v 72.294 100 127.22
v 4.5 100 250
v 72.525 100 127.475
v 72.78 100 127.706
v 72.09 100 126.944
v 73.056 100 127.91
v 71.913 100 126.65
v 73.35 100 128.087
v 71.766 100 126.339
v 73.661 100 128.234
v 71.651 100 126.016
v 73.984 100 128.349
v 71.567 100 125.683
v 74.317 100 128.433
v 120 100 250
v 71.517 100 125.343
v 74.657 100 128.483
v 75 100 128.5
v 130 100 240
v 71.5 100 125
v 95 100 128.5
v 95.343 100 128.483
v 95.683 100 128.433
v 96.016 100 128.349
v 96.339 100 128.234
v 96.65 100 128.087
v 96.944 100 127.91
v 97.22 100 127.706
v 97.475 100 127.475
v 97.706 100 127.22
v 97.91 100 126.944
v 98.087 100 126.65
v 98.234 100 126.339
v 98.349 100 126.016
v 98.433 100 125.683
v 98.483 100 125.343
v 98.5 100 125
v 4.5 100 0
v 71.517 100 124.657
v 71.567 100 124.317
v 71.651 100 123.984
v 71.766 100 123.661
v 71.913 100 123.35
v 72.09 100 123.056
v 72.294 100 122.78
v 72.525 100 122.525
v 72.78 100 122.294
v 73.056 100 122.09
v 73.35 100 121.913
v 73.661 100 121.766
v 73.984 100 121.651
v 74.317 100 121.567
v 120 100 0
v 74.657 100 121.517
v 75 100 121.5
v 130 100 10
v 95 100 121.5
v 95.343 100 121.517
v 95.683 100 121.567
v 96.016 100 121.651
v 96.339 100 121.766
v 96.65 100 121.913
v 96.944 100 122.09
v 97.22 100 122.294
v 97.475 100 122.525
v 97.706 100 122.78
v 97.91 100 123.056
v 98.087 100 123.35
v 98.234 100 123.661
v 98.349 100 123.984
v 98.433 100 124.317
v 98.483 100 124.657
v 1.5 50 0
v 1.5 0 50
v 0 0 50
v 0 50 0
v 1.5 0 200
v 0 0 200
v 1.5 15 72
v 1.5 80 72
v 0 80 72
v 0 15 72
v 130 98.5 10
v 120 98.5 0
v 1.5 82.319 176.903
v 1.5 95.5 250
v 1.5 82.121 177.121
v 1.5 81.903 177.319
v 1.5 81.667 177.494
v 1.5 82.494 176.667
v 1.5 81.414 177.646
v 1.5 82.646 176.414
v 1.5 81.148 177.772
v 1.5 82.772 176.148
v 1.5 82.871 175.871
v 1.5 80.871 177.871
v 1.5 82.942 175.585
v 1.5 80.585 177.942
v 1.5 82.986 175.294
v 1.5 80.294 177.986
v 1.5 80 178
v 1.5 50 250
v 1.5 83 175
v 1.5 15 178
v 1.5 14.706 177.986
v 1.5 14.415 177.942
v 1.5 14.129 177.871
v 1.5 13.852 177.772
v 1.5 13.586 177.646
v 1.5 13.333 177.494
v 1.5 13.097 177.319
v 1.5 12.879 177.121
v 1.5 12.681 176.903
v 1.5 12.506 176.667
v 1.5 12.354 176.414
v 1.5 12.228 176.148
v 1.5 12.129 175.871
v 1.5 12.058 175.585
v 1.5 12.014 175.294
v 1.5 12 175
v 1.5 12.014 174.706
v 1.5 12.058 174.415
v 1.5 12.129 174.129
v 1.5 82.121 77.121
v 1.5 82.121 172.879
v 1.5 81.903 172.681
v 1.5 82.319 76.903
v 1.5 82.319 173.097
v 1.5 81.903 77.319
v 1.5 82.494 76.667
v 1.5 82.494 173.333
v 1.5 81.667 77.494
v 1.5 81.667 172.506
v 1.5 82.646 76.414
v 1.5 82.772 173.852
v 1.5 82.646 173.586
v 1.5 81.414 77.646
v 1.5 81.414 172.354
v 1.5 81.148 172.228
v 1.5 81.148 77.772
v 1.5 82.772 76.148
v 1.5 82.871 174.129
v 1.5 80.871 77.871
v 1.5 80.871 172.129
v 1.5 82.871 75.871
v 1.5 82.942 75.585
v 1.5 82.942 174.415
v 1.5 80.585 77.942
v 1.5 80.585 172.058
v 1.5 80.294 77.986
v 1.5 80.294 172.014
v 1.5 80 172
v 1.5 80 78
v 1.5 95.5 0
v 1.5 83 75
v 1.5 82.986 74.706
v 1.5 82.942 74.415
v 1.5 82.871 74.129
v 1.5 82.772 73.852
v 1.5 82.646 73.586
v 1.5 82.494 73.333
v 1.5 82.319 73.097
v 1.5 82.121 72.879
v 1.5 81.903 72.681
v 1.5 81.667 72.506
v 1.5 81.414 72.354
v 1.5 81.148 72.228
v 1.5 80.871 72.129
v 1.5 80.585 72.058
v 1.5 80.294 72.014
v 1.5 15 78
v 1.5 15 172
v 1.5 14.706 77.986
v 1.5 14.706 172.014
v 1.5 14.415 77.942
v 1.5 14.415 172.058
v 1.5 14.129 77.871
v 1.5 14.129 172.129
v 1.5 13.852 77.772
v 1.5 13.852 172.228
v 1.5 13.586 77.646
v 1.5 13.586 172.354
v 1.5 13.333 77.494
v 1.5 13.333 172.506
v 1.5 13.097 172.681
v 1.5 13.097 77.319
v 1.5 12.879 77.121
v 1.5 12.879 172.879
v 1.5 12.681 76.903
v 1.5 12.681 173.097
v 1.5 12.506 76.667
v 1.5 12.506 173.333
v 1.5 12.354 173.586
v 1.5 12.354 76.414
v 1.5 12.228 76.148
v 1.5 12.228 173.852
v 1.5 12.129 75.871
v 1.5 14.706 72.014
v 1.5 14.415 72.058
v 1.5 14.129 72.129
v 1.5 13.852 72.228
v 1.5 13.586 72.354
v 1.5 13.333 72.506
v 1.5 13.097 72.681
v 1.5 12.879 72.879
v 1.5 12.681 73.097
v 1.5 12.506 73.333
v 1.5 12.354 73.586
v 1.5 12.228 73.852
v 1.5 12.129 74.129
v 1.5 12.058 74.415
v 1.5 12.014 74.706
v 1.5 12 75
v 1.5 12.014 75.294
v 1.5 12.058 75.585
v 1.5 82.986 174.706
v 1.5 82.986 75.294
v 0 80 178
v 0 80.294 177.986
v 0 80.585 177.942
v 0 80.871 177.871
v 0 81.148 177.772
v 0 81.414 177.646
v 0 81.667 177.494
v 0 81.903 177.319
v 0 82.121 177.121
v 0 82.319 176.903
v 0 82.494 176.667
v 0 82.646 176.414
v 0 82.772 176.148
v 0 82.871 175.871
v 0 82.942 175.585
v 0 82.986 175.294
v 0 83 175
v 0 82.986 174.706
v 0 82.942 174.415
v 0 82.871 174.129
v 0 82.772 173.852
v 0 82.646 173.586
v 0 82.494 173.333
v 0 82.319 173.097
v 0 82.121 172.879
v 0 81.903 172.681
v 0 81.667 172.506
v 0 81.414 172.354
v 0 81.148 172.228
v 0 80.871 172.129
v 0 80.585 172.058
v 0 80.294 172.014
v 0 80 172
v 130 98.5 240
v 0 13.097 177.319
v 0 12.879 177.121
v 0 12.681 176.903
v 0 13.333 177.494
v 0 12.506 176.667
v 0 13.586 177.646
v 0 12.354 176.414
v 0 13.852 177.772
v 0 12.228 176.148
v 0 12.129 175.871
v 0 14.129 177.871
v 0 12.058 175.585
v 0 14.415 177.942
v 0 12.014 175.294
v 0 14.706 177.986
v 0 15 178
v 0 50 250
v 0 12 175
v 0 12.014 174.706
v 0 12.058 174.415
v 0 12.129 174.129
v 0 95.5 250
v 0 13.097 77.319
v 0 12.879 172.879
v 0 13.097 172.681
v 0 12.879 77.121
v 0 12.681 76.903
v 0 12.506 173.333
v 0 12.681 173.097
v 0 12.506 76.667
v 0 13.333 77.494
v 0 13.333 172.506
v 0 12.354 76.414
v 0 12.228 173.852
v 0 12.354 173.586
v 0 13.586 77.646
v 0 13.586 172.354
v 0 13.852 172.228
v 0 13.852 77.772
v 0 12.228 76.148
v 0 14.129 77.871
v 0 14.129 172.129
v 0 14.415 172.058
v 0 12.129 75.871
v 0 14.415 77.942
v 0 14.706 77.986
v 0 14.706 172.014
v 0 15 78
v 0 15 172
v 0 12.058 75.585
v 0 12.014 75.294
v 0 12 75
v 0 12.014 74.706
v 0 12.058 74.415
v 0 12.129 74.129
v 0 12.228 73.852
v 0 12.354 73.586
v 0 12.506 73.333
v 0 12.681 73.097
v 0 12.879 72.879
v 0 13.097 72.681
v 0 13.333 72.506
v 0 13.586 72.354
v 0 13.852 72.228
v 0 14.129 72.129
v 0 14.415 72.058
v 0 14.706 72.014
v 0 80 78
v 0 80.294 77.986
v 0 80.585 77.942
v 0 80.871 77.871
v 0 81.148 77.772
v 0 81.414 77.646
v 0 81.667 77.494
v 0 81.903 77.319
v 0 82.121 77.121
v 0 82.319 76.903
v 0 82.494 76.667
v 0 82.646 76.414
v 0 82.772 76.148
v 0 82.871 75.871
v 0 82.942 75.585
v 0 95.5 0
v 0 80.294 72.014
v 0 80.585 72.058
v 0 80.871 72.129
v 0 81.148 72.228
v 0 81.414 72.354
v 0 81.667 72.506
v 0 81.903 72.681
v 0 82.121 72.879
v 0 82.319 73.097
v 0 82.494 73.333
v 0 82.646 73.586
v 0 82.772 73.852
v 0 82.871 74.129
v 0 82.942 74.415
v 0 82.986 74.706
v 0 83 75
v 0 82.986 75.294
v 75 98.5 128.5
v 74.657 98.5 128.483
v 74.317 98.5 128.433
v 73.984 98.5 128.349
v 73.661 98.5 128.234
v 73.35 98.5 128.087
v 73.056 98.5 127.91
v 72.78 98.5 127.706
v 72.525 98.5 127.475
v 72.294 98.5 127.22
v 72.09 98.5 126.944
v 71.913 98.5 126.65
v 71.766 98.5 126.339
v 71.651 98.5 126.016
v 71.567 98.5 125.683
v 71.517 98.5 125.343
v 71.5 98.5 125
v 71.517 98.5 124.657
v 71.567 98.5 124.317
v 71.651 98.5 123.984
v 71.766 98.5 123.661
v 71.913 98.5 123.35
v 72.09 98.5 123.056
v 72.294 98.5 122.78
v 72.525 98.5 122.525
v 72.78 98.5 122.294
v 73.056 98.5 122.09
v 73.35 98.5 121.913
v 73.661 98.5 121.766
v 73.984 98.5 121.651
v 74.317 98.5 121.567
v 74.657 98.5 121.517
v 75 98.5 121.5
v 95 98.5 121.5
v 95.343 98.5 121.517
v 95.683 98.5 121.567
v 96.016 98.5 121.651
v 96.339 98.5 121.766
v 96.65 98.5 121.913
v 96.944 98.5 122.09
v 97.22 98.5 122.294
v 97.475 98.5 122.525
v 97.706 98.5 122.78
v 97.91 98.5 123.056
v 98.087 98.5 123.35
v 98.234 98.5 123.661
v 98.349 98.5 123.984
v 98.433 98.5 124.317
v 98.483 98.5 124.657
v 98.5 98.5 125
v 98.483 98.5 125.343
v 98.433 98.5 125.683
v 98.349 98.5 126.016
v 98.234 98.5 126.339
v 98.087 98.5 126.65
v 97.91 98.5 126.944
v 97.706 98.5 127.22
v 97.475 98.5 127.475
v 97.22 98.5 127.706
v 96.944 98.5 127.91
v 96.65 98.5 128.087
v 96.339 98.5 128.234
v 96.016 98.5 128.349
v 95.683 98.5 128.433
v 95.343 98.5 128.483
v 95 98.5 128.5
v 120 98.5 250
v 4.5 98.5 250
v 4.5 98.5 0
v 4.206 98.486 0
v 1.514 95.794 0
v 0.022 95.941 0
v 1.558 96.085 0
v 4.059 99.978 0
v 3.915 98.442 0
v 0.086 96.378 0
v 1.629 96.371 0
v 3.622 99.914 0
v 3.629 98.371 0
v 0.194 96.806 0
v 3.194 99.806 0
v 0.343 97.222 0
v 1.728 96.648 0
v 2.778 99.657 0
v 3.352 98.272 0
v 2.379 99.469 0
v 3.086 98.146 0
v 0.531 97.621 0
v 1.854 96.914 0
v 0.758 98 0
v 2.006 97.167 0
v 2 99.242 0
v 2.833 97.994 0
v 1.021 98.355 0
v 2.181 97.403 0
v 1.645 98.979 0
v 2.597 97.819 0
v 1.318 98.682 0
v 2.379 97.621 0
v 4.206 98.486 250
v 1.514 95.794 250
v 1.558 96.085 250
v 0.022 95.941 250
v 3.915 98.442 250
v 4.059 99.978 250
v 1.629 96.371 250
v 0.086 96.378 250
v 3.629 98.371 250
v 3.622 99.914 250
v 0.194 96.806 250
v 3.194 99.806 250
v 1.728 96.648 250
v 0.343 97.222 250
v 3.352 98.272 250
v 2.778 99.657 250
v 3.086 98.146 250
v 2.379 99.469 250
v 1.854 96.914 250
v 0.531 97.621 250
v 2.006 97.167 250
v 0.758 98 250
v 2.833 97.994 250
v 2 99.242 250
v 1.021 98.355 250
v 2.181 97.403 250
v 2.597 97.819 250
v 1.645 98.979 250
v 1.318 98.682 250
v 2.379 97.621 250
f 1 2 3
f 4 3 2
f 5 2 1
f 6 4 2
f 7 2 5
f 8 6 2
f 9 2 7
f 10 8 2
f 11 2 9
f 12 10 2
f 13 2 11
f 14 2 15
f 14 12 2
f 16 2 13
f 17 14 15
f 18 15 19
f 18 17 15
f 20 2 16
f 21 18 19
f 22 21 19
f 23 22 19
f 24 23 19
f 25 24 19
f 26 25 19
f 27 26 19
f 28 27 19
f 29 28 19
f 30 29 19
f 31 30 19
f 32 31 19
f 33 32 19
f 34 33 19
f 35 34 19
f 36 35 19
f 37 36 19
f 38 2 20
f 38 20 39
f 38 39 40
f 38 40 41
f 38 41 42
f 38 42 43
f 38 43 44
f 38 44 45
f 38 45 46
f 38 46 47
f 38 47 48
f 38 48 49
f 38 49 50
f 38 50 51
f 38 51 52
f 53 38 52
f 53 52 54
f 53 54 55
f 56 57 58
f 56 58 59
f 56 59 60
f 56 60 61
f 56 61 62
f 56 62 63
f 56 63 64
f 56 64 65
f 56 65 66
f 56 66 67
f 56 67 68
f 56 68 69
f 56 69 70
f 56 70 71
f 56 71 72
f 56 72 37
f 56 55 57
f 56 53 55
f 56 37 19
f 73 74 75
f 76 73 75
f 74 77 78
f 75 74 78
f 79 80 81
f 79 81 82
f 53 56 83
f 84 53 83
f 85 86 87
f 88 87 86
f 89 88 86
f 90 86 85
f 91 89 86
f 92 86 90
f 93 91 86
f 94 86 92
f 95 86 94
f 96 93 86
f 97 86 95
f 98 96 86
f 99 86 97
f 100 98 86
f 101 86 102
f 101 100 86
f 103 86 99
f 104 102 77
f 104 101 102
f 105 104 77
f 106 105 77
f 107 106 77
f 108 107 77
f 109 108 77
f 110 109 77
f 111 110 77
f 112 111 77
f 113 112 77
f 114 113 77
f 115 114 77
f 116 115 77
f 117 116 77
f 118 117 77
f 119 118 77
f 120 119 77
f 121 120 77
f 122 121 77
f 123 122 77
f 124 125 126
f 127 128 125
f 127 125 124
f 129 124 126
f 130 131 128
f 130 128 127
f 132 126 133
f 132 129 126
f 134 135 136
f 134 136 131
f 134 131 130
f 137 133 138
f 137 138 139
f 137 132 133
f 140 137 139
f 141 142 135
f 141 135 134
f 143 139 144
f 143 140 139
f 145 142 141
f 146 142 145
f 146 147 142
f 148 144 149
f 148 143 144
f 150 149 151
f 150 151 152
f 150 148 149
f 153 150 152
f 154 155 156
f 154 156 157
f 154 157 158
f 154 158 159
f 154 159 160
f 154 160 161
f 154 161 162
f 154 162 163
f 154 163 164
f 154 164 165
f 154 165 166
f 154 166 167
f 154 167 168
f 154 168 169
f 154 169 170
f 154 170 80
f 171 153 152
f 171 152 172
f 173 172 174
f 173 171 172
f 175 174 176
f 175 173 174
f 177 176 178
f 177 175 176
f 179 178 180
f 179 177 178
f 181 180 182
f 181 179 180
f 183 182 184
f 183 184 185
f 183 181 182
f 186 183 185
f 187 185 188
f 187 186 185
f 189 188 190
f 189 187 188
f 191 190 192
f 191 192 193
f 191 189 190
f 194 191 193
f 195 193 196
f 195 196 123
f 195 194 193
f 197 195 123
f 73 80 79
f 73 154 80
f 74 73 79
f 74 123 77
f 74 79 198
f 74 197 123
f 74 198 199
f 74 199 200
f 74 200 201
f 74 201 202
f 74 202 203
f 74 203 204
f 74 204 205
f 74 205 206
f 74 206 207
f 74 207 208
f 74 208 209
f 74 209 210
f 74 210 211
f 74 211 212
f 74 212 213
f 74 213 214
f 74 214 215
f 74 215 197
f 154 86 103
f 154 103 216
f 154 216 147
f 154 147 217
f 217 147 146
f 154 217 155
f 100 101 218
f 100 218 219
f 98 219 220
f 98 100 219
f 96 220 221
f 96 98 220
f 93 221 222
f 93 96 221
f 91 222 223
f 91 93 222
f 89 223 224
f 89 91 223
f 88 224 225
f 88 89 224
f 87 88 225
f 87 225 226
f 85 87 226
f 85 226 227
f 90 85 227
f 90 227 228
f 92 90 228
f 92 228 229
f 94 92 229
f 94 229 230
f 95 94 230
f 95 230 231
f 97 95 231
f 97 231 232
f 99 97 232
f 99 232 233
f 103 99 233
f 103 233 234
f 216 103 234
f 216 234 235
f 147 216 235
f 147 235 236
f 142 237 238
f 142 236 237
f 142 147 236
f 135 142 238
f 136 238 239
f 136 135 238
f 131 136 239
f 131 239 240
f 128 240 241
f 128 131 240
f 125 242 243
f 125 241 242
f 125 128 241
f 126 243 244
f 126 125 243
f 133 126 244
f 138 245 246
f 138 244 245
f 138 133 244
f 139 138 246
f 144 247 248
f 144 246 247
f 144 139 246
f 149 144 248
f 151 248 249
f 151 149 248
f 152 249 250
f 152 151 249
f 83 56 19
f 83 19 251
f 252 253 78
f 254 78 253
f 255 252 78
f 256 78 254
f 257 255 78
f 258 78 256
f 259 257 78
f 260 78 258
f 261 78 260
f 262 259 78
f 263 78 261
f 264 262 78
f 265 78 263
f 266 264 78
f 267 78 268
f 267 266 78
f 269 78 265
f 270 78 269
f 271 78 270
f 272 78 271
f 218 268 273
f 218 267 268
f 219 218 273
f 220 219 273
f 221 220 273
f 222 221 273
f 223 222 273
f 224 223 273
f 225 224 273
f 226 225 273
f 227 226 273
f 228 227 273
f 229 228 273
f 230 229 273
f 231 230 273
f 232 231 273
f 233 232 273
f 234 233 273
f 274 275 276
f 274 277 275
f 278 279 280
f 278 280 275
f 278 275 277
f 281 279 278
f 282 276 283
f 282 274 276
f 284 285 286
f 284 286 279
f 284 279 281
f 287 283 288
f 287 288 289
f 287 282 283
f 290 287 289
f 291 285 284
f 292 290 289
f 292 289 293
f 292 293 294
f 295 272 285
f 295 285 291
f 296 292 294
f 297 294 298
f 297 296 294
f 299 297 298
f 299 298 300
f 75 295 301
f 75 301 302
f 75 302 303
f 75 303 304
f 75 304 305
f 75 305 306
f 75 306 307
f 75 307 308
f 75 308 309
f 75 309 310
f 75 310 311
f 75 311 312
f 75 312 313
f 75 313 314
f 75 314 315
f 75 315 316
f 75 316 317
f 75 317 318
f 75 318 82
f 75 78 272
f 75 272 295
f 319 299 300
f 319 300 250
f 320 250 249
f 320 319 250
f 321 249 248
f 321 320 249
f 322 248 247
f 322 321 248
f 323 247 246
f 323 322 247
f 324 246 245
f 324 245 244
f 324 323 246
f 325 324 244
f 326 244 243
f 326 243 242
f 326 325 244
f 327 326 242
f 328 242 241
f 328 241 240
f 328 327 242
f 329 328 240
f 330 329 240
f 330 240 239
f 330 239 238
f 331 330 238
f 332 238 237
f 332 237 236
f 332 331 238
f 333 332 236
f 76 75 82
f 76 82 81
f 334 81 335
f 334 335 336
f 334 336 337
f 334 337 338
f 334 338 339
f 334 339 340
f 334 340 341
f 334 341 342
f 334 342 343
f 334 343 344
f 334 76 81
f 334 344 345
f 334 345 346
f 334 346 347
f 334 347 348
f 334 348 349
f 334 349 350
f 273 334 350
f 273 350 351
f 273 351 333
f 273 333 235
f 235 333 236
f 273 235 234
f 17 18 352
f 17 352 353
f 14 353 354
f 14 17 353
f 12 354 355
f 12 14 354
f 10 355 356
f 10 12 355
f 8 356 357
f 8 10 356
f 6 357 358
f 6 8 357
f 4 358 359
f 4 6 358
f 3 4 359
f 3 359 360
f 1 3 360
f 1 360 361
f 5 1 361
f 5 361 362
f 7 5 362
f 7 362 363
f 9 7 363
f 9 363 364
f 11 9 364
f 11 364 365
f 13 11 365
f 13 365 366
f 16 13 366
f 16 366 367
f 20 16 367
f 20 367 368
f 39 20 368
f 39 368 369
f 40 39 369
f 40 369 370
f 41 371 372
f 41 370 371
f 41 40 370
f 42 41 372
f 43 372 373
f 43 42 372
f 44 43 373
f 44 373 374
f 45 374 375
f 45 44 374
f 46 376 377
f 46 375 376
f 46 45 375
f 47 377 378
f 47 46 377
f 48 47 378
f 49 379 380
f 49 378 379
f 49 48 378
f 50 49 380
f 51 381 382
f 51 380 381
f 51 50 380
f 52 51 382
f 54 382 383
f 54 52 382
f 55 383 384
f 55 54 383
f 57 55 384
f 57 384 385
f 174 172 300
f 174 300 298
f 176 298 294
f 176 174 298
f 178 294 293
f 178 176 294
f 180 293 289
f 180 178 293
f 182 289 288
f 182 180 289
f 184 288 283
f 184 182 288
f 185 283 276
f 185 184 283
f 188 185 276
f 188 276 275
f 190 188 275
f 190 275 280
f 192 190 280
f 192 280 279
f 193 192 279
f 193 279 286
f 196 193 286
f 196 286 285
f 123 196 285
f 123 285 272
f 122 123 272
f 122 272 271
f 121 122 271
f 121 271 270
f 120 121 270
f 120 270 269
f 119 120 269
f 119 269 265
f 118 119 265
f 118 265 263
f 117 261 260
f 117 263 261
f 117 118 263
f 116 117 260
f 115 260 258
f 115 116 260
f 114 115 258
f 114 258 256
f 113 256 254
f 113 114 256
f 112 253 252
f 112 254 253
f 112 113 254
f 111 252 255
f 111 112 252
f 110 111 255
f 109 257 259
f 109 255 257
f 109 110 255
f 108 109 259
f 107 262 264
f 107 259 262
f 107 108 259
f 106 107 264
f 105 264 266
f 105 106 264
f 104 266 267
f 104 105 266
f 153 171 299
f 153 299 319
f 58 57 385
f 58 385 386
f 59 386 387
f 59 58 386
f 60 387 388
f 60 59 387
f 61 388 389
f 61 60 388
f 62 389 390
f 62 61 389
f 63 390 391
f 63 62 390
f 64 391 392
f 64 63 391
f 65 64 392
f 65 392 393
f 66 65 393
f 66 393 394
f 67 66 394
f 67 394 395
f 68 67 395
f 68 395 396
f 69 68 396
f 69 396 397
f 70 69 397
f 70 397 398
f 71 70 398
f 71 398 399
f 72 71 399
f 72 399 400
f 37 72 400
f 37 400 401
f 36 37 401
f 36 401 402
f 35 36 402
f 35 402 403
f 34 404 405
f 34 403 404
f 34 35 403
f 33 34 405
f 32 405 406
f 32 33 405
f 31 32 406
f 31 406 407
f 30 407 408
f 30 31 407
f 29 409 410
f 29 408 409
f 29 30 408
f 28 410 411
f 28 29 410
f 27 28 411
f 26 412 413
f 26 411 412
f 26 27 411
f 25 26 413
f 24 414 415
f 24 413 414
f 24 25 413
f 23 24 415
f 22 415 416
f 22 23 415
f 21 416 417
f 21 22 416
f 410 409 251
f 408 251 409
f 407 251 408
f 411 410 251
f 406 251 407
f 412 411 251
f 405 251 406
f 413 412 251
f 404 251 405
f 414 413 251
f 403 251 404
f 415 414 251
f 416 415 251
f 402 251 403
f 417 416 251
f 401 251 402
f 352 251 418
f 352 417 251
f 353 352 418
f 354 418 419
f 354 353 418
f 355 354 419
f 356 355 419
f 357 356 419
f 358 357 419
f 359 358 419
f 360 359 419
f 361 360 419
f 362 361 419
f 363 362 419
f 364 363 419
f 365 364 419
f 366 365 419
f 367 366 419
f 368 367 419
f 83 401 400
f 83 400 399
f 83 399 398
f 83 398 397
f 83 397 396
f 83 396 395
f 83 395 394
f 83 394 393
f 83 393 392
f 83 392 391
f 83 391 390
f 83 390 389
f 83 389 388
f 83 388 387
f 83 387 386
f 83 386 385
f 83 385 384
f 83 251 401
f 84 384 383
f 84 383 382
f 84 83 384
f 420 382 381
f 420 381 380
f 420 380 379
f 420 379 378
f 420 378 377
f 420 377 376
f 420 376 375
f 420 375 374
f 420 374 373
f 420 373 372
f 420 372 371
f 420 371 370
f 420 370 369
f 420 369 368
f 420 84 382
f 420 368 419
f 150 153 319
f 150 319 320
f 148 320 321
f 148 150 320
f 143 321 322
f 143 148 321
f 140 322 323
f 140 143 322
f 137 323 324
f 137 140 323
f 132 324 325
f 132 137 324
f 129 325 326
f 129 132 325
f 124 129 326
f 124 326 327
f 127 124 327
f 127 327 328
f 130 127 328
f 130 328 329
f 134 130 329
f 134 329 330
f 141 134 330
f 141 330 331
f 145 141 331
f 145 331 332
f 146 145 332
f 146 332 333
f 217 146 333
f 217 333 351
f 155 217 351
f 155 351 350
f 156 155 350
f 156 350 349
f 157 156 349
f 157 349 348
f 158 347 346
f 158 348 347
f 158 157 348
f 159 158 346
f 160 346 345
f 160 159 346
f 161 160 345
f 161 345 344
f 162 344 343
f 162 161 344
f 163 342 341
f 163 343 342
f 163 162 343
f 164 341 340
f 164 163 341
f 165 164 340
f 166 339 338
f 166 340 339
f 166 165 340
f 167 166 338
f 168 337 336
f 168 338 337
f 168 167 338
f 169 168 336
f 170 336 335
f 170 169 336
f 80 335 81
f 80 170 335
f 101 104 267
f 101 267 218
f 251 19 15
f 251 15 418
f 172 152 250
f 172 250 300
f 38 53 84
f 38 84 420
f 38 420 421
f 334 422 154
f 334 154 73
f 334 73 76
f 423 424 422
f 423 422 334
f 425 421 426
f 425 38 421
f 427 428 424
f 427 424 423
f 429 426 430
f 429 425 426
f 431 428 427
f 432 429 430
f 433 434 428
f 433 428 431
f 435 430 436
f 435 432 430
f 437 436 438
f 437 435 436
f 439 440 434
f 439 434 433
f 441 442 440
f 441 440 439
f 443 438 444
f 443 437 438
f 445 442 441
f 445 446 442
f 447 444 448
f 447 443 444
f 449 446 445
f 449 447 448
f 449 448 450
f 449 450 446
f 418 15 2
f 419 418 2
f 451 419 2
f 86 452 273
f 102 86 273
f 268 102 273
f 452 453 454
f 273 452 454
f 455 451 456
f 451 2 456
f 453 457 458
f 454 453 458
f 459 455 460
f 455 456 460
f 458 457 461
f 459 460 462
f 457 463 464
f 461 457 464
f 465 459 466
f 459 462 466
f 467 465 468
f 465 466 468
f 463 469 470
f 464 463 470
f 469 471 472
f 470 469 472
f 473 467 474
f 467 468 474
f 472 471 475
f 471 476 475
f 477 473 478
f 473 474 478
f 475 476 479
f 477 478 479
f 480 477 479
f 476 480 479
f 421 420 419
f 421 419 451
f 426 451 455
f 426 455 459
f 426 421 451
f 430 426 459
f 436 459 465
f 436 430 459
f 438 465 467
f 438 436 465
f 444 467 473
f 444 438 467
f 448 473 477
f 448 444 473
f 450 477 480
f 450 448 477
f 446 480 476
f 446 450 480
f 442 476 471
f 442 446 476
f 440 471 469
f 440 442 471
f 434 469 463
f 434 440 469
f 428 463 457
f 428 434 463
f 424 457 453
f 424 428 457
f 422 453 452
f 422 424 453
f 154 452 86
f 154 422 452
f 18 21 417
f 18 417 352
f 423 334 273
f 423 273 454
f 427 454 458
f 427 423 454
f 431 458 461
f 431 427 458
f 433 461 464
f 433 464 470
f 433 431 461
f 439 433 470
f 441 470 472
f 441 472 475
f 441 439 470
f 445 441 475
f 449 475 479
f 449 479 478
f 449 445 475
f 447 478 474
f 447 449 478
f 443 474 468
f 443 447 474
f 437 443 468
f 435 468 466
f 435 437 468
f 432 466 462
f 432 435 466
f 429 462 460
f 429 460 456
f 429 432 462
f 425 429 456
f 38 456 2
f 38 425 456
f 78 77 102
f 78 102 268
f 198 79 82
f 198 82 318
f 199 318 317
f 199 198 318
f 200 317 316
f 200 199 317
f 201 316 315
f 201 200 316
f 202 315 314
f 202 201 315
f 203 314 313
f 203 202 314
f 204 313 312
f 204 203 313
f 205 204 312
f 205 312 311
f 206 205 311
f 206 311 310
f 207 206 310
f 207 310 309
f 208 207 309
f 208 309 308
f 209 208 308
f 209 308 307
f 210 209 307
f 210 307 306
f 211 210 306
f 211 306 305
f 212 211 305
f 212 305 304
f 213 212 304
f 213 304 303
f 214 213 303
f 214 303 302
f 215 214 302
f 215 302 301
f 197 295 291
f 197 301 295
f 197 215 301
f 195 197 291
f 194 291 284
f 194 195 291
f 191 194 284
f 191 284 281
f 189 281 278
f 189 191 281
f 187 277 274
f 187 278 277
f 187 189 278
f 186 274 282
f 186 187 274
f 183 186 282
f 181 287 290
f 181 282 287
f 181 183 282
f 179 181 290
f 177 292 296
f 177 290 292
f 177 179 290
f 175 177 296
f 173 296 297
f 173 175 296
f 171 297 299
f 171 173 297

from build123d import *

# Parameters (mm, degrees)
BASE_FLANGE1_DEPTH = 250
CUT_EXTRUDE1_DEPTH = 10
CHAMFER1_SIZE      = 10
CUT_EXTRUDE3_DEPTH = 10
CHAMFER2_SIZE      = 50


# Sheet-metal steps are written as plain solids
with BuildPart() as part:
    # Sketch1 → Base-Flange1 (new body)
    with BuildSketch(Plane.XY):
        with BuildLine():
            Line((0, 0), (0, 95.5))
            ThreePointArc((0, 95.5), (1.318019485, 98.681980515), (4.5, 100))
            Line((4.5, 100), (130, 100))
            Line((130, 100), (130, 98.5))
            Line((130, 98.5), (4.5, 98.5))
            ThreePointArc((4.5, 98.5), (2.378679656, 97.621320344), (1.5, 95.5))
            Line((1.5, 95.5), (1.5, 0))
            Line((1.5, 0), (0, 0))
        make_face()
    extrude(amount=BASE_FLANGE1_DEPTH)

    # Sketch6 → Cut-Extrude1 (cut)
    with BuildSketch(Plane(origin=(0, 100, 0), x_dir=(1, 0, 0), z_dir=(0, 1, 0))):
        with BuildLine():
            Line((95, -128.5), (75, -128.5))
            ThreePointArc((75, -128.5), (71.5, -125), (75, -121.5))
            Line((75, -121.5), (95, -121.5))
            ThreePointArc((95, -121.5), (98.5, -125), (95, -128.5))
        make_face()
    extrude(amount=-CUT_EXTRUDE1_DEPTH, mode=Mode.SUBTRACT)

    # Chamfer1
    chamfer1_edges = [part.edges().sort_by_distance(p)[0] for p in [
        (130, 99.25, 250),
        (130, 99.25, 0),
    ]]
    chamfer(chamfer1_edges, length=CHAMFER1_SIZE)

    # Sketch9 → Cut-Extrude3 (cut)
    with BuildSketch(Plane(origin=(1.5, 0, 0), x_dir=(0, 0, -1), z_dir=(1, 0, 0))):
        with BuildLine():
            Line((-178, 15), (-178, 80))
            ThreePointArc((-178, 80), (-175, 83), (-172, 80))
            Line((-172, 80), (-172, 15))
            ThreePointArc((-172, 15), (-175, 12), (-178, 15))
        make_face()
        with BuildLine():
            Line((-78, 15), (-78, 80))
            ThreePointArc((-78, 80), (-75, 83), (-72, 80))
            Line((-72, 80), (-72, 15))
            ThreePointArc((-72, 15), (-75, 12), (-78, 15))
        make_face()
    extrude(amount=-CUT_EXTRUDE3_DEPTH, mode=Mode.SUBTRACT)

    # Chamfer2
    chamfer2_edges = [part.edges().sort_by_distance(p)[0] for p in [
        (0.75, 0, 250),
        (0.75, 0, 0),
    ]]
    chamfer(chamfer2_edges, length=CHAMFER2_SIZE)


solid = part.part
